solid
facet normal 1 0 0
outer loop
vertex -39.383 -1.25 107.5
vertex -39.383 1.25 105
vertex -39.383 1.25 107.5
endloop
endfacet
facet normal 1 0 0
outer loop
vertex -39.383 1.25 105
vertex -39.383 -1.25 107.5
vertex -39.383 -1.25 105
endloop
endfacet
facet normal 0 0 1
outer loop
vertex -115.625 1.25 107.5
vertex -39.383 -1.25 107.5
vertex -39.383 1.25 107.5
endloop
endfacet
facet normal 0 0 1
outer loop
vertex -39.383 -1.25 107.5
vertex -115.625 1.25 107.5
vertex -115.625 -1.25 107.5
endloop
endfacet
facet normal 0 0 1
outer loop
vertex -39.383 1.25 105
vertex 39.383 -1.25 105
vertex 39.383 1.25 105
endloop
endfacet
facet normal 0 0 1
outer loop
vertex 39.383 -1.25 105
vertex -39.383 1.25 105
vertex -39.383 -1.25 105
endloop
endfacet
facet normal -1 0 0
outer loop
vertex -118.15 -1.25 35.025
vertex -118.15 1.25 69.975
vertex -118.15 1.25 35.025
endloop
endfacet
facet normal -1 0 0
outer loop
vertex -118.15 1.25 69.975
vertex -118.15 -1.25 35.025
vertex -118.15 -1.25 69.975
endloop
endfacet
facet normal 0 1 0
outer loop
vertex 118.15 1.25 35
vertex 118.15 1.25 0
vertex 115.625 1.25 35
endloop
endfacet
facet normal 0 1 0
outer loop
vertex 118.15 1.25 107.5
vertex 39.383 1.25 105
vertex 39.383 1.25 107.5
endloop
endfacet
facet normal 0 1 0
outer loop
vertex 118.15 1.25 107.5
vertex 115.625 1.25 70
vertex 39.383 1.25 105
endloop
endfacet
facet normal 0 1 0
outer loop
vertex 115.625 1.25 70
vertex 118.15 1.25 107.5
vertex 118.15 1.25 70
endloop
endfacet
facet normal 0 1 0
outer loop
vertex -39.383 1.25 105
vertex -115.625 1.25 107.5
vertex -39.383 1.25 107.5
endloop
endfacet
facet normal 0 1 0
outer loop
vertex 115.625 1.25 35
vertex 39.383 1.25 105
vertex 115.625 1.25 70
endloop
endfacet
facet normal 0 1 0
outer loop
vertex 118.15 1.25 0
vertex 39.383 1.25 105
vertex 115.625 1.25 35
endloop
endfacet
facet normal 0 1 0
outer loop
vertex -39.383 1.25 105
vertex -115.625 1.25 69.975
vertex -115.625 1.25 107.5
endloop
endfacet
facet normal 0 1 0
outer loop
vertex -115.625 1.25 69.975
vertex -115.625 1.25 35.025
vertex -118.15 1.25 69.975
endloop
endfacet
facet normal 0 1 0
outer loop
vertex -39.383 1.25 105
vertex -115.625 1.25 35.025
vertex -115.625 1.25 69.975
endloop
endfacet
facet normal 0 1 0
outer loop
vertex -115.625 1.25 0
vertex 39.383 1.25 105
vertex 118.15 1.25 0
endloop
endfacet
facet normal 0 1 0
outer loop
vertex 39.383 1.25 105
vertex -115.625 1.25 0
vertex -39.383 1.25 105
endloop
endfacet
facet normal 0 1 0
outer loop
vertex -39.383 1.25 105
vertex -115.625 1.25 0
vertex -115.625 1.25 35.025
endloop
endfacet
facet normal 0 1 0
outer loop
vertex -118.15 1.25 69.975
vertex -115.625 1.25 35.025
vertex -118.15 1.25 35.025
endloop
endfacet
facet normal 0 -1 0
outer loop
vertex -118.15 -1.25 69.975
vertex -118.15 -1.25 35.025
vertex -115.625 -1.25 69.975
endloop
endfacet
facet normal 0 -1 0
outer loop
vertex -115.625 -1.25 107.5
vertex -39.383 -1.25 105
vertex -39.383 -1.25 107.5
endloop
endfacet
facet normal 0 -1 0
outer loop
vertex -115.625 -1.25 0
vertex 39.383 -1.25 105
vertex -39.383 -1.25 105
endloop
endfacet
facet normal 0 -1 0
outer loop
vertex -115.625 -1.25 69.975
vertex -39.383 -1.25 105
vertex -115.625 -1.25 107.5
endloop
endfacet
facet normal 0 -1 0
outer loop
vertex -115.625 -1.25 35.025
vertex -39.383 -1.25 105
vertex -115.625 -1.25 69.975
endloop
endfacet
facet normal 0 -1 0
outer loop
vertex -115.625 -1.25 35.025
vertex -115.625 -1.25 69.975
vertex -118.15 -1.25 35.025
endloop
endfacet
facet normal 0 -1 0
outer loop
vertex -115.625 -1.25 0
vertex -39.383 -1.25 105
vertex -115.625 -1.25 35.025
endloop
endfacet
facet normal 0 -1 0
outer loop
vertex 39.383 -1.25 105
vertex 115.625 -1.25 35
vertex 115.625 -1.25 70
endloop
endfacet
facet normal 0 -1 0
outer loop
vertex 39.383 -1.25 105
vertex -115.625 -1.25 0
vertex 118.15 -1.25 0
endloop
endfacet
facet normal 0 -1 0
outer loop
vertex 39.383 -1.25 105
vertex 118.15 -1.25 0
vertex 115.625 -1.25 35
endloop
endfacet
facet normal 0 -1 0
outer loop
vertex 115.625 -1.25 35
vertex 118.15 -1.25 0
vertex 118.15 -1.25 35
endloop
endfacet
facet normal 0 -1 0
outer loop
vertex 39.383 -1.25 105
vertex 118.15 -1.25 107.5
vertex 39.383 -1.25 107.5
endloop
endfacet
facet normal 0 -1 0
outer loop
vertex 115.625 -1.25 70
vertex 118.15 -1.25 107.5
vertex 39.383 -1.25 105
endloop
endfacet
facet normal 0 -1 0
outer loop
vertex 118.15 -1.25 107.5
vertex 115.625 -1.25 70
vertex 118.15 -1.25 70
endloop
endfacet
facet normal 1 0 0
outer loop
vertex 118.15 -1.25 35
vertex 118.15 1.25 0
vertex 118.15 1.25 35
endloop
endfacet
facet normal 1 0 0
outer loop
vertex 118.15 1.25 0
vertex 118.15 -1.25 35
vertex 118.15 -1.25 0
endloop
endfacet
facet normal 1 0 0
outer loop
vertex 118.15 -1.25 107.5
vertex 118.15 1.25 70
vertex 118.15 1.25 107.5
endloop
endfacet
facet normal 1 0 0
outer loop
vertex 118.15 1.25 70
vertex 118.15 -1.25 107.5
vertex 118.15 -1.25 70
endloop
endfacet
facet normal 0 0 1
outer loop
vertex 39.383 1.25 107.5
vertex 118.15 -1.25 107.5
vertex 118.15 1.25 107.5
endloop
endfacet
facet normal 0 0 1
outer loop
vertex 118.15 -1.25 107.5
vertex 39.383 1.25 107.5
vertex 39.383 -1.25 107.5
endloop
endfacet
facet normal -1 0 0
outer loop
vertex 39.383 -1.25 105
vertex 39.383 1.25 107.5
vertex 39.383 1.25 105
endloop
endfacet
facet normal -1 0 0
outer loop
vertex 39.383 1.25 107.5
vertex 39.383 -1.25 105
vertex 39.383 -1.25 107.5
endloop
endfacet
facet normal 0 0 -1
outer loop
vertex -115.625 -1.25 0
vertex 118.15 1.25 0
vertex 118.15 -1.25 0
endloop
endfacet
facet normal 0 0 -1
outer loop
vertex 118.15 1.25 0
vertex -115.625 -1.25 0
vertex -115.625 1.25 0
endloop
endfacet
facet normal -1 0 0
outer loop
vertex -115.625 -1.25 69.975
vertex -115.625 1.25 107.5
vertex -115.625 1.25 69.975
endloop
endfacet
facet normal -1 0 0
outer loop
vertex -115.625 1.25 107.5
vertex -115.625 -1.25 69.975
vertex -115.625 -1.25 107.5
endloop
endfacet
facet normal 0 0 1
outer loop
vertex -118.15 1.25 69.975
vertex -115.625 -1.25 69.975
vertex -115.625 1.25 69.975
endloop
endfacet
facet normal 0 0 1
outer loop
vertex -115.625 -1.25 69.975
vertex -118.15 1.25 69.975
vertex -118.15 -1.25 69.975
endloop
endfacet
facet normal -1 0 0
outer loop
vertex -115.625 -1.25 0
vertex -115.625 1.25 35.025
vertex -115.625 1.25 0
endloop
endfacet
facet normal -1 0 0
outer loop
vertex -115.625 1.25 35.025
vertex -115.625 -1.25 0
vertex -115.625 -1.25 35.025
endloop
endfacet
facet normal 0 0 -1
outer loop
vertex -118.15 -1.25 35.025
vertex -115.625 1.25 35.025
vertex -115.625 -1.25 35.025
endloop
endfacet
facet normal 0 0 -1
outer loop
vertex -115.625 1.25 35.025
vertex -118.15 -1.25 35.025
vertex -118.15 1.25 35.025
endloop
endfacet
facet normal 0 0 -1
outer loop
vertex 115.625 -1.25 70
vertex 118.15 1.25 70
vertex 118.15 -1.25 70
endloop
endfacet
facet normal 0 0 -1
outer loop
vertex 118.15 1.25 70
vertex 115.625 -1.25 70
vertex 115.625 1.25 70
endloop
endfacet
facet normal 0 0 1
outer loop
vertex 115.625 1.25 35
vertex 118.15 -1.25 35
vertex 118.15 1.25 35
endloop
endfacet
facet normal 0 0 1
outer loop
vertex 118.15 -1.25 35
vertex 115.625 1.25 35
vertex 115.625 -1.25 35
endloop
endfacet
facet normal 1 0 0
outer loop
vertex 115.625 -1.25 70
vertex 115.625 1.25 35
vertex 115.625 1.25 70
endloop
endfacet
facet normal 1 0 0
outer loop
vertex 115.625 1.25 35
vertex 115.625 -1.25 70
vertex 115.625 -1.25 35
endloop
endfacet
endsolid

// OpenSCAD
// file: config.scad
// all measures in millimeters

// material to cut the model parts from
material_z = 2.5;
//material_z = 3;

// size of the shield walls to fit inside the container
size_x = 240.5 - 4.2;
size_y = size_x;
size_z = 105;
nothing = 0.05;

/*
size_x = 50;
size_y = size_x;
size_z = size_x/2.4;
nothing = 0;
*/
// main file
include <config.scad>;

module side_with_top_noses()
{
    // base
    translate([
        0,
        0,
        size_z/2
        ])
    cube([
        size_x,
        material_z,
        size_z
        ], center=true);

    // top noses
    for (x = [
            -size_x/3,
            +size_x/3
            ])
    {
        translate([
            x,
            0,
            size_z + material_z/2
            ])
        cube([
            size_x/3,
            material_z,
            material_z
            ], center=true);
    }
}

module side()
{
    difference()
    {
        side_with_top_noses();

        // nose cutaway left top
        translate([
            -size_x/2 + material_z/2,
            0,
            size_z/6 + 2*size_z/3 + material_z/2
            ])
        cube([
            material_z + nothing,
            material_z + nothing,
            size_z/3 + material_z + nothing
            ], center=true);

        // nose cutaway left bottom
        translate([
            -size_x/2 + material_z/2,
            0,
            size_z/6
            ])
        cube([
            material_z + nothing,
            material_z + nothing,
            size_z/3 + nothing
            ], center=true);

        // nose cutaway right
        translate([
            size_x/2 - material_z/2,
            0,
            size_z/6 + size_z/3
            ])
        cube([
            material_z + nothing,
            material_z + nothing,
            size_z/3
            ], center=true);
    }
}

module side_translated()
{
    translate([
        0,
        -size_x/2 + material_z/2,
        0
        ])
    side();
}

side();
